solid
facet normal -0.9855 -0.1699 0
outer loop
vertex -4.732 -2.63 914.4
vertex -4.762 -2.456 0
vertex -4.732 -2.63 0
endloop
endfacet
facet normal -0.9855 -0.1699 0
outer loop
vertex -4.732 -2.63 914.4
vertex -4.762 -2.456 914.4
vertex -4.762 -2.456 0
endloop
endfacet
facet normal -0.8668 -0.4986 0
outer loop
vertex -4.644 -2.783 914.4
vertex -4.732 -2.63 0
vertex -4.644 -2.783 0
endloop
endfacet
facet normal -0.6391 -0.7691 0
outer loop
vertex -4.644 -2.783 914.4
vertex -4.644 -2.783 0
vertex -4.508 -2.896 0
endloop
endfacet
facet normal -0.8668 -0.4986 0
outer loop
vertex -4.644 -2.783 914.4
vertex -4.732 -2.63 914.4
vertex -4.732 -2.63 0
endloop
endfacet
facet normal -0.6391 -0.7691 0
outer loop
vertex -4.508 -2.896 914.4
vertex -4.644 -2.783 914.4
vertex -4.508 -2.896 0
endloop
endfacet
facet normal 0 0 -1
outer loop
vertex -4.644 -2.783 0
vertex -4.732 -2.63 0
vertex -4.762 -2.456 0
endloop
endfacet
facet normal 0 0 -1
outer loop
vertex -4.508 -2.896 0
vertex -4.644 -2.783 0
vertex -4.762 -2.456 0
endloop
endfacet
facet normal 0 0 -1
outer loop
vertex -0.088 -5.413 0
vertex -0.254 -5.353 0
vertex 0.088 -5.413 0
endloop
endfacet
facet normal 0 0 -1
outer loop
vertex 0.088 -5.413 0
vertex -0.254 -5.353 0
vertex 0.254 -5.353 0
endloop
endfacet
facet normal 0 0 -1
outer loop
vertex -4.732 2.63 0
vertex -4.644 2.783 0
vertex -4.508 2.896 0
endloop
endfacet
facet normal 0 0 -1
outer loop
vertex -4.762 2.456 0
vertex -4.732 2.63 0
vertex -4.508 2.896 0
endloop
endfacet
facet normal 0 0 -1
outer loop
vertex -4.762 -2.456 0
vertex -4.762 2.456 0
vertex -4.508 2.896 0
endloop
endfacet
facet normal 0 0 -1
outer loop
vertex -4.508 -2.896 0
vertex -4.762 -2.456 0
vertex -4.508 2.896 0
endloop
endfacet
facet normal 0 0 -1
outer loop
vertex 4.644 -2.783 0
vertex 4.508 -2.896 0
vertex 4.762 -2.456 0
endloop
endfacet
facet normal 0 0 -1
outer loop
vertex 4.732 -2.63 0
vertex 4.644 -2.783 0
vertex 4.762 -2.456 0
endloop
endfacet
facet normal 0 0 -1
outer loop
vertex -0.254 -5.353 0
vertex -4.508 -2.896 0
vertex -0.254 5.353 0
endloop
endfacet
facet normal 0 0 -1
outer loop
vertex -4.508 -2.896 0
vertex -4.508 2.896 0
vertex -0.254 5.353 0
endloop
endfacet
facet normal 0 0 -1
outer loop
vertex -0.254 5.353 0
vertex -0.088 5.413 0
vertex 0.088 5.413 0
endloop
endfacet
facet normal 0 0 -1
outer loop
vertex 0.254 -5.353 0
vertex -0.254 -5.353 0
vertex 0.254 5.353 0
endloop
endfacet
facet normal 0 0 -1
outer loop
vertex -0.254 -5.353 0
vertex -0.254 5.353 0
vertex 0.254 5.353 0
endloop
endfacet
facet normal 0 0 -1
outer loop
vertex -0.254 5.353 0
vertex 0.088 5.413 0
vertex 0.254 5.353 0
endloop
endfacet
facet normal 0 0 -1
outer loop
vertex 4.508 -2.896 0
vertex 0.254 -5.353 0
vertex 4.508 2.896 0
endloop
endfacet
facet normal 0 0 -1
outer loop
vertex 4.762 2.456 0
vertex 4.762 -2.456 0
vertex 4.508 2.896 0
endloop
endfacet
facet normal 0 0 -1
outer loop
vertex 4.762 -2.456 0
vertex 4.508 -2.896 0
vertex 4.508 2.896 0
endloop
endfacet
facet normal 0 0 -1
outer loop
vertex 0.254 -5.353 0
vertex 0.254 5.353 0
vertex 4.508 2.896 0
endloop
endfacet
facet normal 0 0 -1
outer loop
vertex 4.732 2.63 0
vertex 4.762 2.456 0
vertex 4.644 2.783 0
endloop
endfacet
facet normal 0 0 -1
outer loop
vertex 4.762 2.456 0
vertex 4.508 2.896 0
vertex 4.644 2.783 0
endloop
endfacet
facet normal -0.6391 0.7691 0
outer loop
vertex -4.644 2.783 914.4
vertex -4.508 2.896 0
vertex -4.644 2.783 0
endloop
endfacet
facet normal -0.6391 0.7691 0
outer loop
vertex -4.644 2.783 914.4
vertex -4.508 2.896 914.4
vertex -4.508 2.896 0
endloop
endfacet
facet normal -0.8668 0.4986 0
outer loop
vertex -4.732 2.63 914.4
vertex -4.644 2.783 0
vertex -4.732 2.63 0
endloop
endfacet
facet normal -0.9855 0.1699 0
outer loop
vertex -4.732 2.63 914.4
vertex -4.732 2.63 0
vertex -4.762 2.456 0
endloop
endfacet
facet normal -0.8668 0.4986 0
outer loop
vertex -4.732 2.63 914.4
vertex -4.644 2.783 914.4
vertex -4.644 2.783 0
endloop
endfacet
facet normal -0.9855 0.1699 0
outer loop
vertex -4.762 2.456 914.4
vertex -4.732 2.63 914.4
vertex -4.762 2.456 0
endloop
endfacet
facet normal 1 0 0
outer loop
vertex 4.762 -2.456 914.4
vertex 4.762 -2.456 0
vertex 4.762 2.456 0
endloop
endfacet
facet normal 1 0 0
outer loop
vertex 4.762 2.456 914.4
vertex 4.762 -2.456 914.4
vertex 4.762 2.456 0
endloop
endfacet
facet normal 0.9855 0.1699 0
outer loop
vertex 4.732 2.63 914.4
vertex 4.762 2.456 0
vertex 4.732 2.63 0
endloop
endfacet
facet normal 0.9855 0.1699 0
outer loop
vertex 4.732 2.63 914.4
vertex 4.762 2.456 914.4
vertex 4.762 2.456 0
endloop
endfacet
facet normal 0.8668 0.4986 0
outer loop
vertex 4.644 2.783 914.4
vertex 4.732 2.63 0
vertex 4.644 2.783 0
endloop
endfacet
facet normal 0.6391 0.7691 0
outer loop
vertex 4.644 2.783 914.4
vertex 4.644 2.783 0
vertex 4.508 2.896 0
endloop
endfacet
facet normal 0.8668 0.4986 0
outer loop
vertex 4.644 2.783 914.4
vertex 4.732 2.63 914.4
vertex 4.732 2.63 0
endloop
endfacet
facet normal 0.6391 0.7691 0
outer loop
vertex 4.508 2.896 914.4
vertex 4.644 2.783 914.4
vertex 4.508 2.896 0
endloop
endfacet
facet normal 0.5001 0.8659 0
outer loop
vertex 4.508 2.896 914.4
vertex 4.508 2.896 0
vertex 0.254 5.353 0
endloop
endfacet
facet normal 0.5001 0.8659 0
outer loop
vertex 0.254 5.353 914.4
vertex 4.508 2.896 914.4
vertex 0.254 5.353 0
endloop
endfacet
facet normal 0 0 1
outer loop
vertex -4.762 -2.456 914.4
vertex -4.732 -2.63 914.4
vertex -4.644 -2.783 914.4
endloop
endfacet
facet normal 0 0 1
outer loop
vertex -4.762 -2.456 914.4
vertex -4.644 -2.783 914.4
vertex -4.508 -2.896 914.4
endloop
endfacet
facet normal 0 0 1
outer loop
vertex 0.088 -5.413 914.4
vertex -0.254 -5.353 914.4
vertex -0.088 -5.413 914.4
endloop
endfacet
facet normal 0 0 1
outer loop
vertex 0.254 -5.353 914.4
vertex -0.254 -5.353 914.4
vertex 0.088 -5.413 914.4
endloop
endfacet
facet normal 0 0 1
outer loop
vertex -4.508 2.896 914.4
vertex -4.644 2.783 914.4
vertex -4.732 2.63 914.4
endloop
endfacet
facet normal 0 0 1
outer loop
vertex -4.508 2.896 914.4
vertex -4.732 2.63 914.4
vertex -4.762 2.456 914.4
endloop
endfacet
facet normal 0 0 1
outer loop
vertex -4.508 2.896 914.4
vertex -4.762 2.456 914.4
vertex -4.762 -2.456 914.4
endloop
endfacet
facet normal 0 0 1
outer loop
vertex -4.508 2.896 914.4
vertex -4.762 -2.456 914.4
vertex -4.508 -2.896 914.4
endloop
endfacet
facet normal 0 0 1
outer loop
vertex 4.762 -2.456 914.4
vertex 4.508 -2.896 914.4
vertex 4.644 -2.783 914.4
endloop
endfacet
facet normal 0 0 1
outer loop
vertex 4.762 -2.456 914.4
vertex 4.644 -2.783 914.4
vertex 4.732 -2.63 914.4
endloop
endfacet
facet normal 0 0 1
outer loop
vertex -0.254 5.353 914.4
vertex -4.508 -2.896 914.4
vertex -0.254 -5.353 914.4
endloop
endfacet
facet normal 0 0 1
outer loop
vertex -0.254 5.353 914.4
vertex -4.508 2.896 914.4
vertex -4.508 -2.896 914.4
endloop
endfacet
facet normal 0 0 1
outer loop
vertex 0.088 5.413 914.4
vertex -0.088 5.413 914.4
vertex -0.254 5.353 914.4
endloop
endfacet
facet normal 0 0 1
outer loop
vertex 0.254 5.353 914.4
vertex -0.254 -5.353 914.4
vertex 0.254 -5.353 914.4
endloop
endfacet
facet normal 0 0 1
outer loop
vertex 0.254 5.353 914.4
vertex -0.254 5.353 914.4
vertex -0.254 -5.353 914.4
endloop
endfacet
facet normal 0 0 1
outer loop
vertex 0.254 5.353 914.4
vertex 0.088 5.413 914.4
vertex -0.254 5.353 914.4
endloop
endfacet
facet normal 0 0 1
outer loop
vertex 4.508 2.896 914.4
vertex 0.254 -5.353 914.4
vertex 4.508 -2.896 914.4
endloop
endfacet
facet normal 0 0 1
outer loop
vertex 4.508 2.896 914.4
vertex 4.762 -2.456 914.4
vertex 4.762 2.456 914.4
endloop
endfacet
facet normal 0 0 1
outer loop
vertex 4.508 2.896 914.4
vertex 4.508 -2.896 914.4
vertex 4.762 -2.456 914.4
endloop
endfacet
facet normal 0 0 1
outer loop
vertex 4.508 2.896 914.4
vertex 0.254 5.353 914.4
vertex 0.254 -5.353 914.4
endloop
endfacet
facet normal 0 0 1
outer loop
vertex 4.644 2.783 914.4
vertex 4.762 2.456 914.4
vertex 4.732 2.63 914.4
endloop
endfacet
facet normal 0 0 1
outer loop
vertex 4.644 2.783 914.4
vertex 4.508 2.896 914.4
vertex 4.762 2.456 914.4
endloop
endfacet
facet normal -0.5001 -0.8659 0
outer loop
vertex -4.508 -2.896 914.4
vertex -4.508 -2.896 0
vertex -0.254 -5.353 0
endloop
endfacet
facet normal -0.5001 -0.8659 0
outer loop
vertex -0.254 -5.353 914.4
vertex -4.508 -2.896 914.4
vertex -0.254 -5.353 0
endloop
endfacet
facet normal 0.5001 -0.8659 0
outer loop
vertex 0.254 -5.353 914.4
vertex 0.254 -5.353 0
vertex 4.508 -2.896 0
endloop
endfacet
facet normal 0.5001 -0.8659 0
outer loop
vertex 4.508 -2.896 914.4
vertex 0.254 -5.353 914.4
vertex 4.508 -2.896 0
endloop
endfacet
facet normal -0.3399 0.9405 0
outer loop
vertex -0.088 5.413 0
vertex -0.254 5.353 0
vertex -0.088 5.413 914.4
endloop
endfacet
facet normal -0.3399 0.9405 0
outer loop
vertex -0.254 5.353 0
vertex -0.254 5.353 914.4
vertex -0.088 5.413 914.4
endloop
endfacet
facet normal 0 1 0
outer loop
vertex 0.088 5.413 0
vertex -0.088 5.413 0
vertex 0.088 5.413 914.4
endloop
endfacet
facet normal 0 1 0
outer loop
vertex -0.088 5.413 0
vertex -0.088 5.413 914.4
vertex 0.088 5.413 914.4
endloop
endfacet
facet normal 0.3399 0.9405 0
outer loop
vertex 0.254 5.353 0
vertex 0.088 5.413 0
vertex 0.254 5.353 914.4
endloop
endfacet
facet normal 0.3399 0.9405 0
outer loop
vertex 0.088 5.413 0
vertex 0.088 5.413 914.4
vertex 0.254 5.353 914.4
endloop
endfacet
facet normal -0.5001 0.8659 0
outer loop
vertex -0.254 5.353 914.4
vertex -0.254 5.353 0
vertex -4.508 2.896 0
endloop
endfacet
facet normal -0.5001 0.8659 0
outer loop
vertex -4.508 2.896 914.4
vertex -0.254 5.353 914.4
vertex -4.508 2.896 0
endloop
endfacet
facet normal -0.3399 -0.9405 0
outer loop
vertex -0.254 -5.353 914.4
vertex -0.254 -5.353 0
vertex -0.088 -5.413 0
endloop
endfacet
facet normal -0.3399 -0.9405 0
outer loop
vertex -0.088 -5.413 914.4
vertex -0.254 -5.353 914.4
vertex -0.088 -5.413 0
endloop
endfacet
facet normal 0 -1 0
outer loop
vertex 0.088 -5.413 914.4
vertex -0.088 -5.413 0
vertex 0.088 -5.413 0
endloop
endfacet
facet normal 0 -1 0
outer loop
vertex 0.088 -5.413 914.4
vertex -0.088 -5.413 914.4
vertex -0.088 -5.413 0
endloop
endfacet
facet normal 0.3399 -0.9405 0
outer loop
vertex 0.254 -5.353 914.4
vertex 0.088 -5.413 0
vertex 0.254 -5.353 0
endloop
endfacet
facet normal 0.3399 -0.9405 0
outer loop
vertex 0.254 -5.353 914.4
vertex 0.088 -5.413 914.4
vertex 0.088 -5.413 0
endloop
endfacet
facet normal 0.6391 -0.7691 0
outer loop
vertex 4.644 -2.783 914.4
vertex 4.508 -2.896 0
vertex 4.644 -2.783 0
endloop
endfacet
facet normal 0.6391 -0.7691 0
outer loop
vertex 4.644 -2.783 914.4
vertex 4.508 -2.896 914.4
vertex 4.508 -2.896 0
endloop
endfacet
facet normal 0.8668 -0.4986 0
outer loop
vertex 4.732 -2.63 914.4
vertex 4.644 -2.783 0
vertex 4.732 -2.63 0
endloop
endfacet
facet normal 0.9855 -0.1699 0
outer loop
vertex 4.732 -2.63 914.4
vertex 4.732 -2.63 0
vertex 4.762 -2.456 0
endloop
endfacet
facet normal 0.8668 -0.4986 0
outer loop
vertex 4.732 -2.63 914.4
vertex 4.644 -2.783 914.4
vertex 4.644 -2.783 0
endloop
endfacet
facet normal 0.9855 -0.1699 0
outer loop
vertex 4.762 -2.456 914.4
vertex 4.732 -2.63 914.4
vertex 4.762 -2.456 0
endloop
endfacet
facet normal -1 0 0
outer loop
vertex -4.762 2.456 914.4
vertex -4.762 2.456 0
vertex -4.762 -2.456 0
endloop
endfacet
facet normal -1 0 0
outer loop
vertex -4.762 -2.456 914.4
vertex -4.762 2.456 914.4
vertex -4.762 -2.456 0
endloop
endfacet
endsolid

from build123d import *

# Parameters (mm, degrees)
SHAFT_BOSS_DEPTH = 914.4
FILLET1_R        = 0.508


with BuildPart() as part:
    # Sketch1 → Shaft Boss (new body)
    with BuildSketch(Plane.XY):
        Polygon((0, 5.499261314), (-4.7625, 2.749630657), (-4.7625, -2.749630657), (0, -5.499261314), (4.7625, -2.749630657), (4.7625, 2.749630657), align=None)
    extrude(amount=SHAFT_BOSS_DEPTH)

    # Fillet1
    fillet1_edges = [part.edges().sort_by_distance(p)[0] for p in [
        (4.7625, 2.749630657, 457.2),
        (4.7625, -2.749630657, 457.2),
        (0, -5.499261314, 457.2),
        (-4.7625, -2.749630657, 457.2),
        (-4.7625, 2.749630657, 457.2),
        (0, 5.499261314, 457.2),
    ]]
    fillet(fillet1_edges, radius=FILLET1_R)


solid = part.part
